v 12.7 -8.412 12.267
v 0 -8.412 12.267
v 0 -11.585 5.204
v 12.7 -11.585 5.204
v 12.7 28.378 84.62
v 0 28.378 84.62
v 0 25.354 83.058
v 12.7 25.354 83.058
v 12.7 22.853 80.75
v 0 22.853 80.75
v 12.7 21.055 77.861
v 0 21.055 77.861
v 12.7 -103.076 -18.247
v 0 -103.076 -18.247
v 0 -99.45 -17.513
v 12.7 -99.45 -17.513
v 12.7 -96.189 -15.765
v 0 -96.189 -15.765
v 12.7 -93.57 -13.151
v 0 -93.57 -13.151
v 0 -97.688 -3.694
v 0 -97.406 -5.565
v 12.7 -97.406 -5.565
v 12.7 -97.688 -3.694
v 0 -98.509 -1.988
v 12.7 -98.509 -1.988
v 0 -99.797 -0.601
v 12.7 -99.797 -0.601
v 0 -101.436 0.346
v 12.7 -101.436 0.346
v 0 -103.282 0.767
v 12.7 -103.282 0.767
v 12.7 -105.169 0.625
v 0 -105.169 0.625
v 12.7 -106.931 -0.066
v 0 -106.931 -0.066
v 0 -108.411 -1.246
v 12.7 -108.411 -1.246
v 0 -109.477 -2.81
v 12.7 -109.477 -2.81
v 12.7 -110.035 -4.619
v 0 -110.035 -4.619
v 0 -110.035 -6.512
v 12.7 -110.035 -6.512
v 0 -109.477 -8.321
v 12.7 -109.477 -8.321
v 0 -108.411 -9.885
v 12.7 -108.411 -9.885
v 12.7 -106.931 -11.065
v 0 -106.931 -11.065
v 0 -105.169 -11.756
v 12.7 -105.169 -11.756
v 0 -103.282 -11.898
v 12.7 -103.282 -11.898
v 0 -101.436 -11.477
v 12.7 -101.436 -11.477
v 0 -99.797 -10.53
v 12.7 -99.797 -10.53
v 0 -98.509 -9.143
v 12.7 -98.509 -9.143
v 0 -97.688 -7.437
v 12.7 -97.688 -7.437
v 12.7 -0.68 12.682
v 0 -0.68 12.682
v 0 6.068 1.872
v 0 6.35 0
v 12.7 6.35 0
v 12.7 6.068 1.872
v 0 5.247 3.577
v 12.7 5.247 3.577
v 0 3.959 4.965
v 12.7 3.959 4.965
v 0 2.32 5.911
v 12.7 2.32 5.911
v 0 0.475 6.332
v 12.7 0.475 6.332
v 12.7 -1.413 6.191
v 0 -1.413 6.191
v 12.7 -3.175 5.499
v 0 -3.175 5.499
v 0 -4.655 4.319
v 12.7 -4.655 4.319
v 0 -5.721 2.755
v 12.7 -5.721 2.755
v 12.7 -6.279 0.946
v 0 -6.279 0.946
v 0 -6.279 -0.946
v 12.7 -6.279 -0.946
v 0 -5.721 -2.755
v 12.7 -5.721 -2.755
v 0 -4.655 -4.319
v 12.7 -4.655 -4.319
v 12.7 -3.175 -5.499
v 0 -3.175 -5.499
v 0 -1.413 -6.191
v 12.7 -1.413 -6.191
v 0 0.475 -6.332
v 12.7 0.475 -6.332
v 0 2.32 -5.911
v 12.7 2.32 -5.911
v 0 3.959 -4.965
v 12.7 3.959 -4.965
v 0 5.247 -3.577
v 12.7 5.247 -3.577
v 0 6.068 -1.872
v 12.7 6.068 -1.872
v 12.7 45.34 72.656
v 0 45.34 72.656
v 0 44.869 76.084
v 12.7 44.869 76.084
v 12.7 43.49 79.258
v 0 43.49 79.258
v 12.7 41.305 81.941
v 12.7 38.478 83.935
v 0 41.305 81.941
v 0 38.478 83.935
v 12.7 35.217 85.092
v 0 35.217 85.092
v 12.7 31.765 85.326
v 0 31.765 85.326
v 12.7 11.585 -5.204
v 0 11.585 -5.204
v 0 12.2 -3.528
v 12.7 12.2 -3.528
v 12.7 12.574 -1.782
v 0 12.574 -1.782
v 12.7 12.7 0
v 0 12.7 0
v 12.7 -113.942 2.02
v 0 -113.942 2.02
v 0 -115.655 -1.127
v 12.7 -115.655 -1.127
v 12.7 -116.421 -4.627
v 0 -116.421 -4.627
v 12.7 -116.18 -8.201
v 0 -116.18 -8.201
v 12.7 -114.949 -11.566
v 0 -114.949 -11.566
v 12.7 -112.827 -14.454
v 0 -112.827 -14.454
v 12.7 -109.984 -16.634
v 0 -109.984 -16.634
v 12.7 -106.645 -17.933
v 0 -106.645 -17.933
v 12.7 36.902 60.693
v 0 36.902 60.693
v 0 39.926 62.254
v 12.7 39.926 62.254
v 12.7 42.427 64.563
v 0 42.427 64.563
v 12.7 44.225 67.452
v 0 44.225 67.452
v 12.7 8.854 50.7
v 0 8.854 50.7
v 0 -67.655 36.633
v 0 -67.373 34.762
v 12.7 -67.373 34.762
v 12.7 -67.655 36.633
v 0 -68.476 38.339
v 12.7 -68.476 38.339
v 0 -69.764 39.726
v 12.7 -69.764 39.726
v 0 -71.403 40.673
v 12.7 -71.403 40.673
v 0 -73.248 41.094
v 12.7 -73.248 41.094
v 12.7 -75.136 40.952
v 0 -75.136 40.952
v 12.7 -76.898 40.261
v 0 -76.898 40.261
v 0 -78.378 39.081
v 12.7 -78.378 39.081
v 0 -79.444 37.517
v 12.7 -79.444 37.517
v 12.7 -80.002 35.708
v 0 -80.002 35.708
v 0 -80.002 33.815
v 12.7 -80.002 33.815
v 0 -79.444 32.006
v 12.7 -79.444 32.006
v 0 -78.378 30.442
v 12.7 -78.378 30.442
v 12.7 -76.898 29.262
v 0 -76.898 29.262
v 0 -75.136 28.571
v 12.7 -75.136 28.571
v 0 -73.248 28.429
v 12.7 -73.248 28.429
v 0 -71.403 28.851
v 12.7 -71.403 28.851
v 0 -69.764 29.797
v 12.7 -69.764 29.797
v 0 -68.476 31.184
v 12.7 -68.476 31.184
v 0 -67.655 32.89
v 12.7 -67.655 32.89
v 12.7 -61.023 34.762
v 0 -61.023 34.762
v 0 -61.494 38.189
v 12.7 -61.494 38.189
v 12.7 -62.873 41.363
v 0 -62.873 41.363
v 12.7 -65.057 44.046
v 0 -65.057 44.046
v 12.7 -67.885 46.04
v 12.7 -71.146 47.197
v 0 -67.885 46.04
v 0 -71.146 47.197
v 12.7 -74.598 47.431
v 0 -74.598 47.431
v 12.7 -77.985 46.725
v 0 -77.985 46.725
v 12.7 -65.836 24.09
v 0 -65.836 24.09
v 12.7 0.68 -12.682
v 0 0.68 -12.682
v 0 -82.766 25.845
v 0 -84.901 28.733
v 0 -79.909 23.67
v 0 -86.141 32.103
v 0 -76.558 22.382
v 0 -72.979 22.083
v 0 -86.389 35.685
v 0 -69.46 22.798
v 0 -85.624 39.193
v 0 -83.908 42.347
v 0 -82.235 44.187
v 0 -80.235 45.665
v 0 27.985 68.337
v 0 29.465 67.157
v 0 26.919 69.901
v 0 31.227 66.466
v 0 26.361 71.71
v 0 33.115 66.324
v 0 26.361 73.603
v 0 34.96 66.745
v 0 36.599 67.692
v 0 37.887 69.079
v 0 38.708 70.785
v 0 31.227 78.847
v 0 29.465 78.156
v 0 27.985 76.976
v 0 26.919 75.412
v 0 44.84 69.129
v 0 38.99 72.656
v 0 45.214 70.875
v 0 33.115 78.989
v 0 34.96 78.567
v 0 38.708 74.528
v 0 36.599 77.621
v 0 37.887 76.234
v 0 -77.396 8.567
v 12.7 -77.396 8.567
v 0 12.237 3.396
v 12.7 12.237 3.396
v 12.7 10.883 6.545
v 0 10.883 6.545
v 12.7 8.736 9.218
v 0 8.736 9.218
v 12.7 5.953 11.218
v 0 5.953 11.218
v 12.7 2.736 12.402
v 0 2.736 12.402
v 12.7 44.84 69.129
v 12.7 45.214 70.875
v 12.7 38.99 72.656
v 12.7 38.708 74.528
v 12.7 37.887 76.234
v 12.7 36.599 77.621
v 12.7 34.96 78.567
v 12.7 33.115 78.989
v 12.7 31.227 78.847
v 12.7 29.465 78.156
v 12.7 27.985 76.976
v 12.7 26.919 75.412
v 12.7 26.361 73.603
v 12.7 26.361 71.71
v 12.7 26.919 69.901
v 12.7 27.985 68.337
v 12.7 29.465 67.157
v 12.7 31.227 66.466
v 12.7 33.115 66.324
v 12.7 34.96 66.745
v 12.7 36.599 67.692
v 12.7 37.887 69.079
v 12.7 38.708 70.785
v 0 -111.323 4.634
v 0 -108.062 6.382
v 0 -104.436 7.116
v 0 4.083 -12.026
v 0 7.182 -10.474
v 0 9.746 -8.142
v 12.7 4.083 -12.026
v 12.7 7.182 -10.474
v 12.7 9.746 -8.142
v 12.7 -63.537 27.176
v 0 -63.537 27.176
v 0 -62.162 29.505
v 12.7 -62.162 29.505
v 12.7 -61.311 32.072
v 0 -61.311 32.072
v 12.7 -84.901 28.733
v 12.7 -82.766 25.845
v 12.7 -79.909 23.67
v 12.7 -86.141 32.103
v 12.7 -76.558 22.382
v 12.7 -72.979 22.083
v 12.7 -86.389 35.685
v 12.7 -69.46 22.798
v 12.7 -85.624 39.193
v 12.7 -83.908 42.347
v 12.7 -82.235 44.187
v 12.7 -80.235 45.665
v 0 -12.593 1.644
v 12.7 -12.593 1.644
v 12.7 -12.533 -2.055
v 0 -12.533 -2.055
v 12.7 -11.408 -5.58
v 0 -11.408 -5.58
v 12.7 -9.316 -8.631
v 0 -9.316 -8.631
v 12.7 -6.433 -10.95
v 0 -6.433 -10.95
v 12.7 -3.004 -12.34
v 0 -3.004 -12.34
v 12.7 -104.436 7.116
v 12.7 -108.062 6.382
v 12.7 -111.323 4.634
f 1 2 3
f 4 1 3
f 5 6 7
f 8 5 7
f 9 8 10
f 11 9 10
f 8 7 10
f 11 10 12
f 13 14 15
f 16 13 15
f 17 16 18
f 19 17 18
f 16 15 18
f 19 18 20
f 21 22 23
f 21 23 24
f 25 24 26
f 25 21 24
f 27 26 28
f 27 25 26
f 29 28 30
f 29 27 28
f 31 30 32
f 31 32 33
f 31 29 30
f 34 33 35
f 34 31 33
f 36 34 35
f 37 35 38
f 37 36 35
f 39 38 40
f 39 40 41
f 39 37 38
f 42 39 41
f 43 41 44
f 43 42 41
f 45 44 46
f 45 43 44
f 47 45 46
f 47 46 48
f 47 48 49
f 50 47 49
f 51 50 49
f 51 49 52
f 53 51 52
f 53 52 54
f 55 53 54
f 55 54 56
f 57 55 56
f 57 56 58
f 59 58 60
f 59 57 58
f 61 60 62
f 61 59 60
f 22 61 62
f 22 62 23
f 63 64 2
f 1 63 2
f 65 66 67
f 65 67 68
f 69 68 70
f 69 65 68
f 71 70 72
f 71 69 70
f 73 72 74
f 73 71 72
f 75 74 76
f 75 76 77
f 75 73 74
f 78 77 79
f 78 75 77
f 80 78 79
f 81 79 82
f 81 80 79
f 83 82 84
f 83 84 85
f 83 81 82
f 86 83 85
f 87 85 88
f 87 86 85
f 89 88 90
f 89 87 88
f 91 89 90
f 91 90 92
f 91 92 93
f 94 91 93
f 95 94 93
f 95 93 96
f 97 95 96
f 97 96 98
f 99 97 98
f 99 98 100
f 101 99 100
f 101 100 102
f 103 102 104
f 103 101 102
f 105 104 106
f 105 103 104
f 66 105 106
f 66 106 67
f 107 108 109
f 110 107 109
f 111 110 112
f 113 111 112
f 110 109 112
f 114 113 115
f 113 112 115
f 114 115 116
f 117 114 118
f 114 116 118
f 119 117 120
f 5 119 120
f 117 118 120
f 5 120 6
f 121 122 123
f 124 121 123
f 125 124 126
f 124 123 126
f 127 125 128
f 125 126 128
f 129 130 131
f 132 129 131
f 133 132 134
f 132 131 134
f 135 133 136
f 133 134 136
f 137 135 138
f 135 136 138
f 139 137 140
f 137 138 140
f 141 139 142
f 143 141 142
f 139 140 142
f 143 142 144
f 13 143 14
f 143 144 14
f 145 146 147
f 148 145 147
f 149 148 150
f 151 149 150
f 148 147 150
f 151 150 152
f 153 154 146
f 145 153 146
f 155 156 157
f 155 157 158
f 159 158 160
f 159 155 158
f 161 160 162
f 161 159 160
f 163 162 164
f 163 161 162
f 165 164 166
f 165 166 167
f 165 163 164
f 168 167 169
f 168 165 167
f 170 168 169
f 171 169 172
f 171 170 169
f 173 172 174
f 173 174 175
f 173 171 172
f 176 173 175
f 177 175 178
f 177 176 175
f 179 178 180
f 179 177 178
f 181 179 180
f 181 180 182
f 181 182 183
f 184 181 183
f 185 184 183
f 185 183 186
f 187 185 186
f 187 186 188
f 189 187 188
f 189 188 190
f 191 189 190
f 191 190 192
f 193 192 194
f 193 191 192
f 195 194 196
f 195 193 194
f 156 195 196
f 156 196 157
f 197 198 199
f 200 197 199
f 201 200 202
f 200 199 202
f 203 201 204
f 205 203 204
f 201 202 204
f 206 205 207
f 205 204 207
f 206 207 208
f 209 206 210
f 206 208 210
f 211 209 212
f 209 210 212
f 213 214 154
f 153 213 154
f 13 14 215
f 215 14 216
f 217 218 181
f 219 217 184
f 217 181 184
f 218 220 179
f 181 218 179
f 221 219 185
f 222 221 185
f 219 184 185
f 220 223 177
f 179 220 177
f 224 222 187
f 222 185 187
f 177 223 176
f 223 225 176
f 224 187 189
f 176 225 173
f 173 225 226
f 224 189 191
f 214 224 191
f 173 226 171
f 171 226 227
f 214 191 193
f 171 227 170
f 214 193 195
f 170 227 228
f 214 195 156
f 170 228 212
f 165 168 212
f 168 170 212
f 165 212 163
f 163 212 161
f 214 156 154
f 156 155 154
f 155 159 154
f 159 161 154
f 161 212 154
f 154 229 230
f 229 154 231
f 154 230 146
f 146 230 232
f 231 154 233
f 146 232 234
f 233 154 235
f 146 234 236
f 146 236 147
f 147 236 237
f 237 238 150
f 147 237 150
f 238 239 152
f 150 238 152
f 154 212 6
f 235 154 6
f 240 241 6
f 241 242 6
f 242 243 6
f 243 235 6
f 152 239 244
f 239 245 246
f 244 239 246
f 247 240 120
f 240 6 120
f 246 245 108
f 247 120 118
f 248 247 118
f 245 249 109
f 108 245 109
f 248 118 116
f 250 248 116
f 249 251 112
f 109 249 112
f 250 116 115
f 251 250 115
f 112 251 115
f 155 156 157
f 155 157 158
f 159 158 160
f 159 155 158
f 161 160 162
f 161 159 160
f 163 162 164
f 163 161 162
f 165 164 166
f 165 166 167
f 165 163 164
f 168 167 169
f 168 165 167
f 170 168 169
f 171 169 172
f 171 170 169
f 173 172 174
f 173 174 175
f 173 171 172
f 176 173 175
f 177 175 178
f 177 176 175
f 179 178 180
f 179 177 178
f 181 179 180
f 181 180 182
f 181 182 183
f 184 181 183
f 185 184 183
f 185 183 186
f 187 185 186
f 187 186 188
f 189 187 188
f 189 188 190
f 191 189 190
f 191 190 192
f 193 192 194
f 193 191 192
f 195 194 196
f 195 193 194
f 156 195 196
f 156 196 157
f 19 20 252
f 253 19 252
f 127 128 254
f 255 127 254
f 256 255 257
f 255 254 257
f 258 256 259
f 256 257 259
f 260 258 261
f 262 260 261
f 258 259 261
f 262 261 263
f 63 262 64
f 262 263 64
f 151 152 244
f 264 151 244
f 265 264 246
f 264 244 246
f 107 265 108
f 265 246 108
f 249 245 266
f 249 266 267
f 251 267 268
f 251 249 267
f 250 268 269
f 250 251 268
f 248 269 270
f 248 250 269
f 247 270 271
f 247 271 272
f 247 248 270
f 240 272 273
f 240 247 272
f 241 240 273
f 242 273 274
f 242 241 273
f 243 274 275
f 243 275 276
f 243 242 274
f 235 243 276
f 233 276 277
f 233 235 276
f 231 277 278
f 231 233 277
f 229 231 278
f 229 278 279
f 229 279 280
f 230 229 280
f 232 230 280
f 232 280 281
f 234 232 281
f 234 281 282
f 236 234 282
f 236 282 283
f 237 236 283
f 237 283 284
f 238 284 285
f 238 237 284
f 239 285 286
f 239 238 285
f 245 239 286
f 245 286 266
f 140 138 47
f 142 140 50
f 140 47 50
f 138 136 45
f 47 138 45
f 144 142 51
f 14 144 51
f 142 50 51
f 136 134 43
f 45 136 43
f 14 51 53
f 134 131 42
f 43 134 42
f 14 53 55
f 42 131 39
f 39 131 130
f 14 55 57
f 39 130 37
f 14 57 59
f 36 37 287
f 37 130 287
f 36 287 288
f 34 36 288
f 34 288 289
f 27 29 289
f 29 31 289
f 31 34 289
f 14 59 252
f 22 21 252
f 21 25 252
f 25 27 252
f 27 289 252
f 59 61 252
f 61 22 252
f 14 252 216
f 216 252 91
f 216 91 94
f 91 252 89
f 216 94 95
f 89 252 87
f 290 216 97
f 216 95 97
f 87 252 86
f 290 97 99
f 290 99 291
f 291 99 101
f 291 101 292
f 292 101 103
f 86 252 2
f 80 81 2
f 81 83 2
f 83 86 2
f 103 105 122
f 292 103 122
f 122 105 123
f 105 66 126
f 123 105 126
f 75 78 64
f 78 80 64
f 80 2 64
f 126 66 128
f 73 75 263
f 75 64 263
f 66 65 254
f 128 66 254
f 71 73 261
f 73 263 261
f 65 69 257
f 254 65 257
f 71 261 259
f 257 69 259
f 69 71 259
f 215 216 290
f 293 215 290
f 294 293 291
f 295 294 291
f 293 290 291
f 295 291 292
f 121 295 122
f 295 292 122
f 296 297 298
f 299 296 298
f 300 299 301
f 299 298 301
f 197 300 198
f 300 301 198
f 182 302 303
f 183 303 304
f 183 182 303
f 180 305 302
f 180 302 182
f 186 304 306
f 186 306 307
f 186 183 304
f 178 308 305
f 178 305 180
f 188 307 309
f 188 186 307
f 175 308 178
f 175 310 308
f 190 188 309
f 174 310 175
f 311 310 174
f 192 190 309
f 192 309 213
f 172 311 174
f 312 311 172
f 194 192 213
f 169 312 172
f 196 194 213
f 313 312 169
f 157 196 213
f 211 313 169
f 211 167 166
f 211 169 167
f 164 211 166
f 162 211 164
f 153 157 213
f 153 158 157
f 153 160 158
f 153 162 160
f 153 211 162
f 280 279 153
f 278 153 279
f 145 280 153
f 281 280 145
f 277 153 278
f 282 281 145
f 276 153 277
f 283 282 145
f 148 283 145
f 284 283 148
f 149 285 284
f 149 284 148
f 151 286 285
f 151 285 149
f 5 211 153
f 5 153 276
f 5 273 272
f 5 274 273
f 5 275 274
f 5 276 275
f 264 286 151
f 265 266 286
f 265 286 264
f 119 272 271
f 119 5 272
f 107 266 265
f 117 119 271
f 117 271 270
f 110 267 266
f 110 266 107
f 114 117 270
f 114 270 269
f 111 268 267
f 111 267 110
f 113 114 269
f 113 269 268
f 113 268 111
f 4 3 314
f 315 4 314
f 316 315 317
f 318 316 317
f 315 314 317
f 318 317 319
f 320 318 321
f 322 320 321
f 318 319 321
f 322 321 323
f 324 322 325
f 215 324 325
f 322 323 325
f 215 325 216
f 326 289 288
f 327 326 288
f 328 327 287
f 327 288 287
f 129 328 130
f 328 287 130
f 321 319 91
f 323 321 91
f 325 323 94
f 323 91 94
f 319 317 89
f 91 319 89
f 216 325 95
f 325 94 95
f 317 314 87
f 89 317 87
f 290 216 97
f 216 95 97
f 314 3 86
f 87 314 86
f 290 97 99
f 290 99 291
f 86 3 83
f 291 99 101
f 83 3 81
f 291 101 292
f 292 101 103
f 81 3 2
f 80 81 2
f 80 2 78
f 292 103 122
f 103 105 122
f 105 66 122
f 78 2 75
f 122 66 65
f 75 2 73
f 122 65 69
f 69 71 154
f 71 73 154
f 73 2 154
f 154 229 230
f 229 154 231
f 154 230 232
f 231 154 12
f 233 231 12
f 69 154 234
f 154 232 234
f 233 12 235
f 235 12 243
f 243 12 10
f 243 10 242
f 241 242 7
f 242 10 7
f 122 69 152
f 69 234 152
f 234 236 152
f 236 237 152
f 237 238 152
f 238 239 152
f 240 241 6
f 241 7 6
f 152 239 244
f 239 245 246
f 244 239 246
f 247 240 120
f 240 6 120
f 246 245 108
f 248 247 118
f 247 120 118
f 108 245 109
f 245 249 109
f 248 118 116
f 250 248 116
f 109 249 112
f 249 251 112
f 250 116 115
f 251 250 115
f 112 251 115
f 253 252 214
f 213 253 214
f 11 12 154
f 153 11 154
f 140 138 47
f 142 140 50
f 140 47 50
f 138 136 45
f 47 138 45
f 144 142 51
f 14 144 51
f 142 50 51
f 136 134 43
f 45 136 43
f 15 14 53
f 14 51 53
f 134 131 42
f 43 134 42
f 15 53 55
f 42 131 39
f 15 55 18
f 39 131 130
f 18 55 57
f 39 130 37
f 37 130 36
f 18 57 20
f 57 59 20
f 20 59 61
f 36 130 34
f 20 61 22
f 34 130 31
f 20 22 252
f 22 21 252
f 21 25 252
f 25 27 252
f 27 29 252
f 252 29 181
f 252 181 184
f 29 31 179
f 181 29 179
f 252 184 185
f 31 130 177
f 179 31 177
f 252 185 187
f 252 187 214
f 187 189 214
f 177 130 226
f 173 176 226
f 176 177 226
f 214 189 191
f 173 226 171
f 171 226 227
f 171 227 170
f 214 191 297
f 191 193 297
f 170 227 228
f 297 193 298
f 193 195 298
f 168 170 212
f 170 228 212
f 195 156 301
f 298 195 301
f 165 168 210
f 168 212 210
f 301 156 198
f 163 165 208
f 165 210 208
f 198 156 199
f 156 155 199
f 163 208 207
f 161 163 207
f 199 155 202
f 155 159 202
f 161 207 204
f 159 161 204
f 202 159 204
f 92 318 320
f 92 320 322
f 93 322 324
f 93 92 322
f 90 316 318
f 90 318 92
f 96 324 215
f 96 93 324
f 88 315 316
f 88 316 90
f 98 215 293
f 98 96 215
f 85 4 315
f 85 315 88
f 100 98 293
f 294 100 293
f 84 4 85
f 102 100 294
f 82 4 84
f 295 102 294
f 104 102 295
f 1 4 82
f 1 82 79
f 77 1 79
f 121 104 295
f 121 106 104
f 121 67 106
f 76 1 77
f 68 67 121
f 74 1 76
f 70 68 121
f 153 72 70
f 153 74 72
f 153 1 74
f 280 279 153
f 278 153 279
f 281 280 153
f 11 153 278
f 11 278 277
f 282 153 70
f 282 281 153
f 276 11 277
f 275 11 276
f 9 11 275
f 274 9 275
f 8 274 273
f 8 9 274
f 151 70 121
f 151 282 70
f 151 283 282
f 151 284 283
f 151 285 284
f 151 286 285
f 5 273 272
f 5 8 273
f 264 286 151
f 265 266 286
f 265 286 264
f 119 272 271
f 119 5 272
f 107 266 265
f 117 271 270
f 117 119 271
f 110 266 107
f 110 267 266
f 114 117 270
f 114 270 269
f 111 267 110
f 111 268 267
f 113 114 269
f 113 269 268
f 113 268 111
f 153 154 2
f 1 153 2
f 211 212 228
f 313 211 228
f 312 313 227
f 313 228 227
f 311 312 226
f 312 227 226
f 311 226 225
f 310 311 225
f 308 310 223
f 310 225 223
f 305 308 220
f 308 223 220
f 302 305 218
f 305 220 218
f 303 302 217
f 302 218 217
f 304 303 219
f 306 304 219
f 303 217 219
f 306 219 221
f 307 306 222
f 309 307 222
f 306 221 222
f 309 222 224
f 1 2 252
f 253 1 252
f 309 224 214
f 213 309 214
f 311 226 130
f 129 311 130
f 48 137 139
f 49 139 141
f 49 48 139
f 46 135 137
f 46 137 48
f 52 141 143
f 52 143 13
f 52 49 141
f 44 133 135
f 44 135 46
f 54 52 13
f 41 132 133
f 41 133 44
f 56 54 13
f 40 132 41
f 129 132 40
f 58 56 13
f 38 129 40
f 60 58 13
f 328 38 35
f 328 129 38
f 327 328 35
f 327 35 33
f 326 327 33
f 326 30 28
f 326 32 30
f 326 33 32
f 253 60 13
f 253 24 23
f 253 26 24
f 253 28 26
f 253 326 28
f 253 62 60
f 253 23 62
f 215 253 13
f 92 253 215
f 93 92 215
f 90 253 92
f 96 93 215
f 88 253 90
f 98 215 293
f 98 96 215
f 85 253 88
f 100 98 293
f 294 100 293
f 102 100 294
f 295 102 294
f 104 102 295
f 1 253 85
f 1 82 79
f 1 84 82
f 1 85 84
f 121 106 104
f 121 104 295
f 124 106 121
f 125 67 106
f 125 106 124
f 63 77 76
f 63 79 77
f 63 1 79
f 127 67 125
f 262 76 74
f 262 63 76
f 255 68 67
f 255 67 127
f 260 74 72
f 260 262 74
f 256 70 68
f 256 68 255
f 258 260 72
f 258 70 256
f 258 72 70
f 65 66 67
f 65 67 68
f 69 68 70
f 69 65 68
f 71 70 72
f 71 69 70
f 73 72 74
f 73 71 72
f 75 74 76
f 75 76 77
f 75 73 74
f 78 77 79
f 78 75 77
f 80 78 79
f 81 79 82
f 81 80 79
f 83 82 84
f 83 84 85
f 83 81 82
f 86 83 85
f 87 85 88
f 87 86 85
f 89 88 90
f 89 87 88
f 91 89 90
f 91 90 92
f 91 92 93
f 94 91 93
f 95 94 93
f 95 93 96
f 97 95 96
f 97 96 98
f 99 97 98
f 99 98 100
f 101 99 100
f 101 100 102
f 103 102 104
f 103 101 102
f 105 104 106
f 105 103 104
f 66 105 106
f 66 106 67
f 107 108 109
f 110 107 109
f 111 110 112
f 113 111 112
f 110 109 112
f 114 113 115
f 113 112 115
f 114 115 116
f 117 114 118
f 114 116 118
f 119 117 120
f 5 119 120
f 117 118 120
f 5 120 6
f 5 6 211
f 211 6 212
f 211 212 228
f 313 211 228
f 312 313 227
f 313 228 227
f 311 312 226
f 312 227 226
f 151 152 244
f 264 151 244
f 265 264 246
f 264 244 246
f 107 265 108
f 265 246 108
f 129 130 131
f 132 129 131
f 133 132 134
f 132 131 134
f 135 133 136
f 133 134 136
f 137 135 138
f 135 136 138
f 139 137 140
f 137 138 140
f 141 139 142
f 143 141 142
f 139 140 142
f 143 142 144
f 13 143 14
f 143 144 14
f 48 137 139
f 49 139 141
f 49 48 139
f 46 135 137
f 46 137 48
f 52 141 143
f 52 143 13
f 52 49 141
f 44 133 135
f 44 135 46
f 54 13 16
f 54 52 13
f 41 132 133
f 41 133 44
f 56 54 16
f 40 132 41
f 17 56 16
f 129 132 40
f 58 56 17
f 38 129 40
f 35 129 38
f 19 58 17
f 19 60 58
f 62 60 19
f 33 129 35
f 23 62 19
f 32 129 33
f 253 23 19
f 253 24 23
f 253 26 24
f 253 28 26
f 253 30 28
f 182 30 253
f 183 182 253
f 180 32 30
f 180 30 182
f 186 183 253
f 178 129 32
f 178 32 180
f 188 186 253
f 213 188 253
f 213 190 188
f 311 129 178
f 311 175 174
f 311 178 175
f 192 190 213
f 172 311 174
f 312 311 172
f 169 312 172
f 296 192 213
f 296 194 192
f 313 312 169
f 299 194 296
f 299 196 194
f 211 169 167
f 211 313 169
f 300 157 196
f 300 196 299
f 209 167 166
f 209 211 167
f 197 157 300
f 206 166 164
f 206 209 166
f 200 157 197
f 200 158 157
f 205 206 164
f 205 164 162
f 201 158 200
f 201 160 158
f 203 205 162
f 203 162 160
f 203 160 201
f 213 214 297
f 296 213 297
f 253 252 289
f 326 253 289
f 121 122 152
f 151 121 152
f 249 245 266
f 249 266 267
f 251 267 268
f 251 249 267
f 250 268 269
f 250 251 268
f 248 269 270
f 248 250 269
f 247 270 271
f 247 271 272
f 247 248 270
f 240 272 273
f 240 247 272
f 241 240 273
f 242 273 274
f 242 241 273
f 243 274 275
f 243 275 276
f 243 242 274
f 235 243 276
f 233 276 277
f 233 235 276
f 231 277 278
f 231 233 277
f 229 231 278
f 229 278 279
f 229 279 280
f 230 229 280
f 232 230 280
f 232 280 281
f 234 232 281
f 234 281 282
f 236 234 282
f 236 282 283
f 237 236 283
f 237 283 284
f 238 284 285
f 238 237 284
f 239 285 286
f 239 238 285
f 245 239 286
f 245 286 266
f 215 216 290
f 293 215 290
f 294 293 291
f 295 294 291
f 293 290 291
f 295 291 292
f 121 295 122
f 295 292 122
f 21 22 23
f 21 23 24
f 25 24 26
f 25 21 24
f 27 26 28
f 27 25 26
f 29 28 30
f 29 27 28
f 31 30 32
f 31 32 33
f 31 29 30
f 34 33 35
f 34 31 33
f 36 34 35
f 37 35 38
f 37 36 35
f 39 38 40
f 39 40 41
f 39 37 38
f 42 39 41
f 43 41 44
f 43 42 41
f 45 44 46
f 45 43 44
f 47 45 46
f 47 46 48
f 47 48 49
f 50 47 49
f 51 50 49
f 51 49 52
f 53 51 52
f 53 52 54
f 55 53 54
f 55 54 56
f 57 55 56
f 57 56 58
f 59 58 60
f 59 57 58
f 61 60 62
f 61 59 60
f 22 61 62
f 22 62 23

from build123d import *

# Parameters (mm, degrees)
F0_R     = 6.35
F1_DEPTH = 12.7
F2_DEPTH = 12.7
F3_DEPTH = 12.7
F4_DEPTH = 12.7


with BuildPart() as f1:
    # F0 (on Right) → F1 (new body)
    with BuildSketch(Plane.YZ):
        with BuildLine():
            ThreePointArc((-83.9083950328, 42.3472659243), (-83.9361302008, 27.2132734438), (-69.4604435559, 22.7981863781))
            ThreePointArc((-69.4604435559, 22.7981863781), (-66.1744473375, 24.5481989863), (-63.5371080479, 27.1758893691))
            ThreePointArc((-63.5371080479, 27.1758893691), (-61.6677178956, 30.7658094073), (-61.0227515404, 34.7615776467))
            ThreePointArc((-61.0227515404, 34.7615776467), (-66.4029602661, 45.1399520715), (-77.9850595248, 46.7249689153))
            ThreePointArc((-77.9850595248, 46.7249689153), (-81.2710557432, 44.9749563071), (-83.9083950328, 42.3472659243))
        make_face()
        with Locations((-73.7227515404, 34.7615776467)):
            Circle(F0_R, mode=Mode.SUBTRACT)
        with BuildLine():
            Line((-104.4363172723, 7.1162714515), (-77.3961663813, 8.5667108531))
            Line((-77.3961663813, 8.5667108531), (-65.8355577842, 24.0896579367))
            Line((-65.8355577842, 24.0896579367), (-69.4604435559, 22.7981863781))
            ThreePointArc((-69.4604435559, 22.7981863781), (-83.9361302008, 27.2132734438), (-83.9083950328, 42.3472659243))
            Line((-83.9083950328, 42.3472659243), (-113.9417080171, 2.0201910748))
            ThreePointArc((-113.9417080171, 2.0201910748), (-109.7568506462, 5.6273829415), (-104.4363172723, 7.1162714515))
        make_face()
        with BuildLine():
            Line((-69.4604435559, 22.7981863781), (-65.8355577842, 24.0896579367))
            Line((-65.8355577842, 24.0896579367), (-63.5371080479, 27.1758893691))
            ThreePointArc((-63.5371080479, 27.1758893691), (-66.1744473375, 24.5481989863), (-69.4604435559, 22.7981863781))
        make_face()
        with BuildLine():
            Line((-93.5704210322, -13.1511854804), (-77.3961663813, 8.5667108531))
            Line((-77.3961663813, 8.5667108531), (-104.4363172723, 7.1162714515))
            ThreePointArc((-104.4363172723, 7.1162714515), (-95.0196238849, 3.6521274884), (-91.0560645247, -5.5654972028))
            ThreePointArc((-91.0560645247, -5.5654972028), (-91.7010308799, -9.5612654422), (-93.5704210322, -13.1511854804))
        make_face()
        with BuildLine():
            ThreePointArc((-113.9417080171, 2.0201910748), (-114.948944669, -11.5662833243), (-103.0758117771, -18.247265857))
            ThreePointArc((-103.0758117771, -18.247265857), (-97.7552784032, -16.758377347), (-93.5704210322, -13.1511854804))
            ThreePointArc((-93.5704210322, -13.1511854804), (-91.7010308799, -9.5612654422), (-91.0560645247, -5.5654972028))
            ThreePointArc((-91.0560645247, -5.5654972028), (-95.0196238849, 3.6521274884), (-104.4363172723, 7.1162714515))
            ThreePointArc((-104.4363172723, 7.1162714515), (-109.7568506462, 5.6273829415), (-113.9417080171, 2.0201910748))
        make_face()
        with Locations((-103.7560645247, -5.5654972028)):
            Circle(F0_R, mode=Mode.SUBTRACT)
    extrude(amount=F1_DEPTH)


with BuildPart() as f2:
    # F0 (on Right) → F2 (new body)
    with BuildSketch(Plane.YZ):
        with BuildLine():
            Line((21.055316714, 77.860714389), (8.853634096, 50.6998666772))
            Line((8.853634096, 50.6998666772), (36.9023292992, 60.6930345702))
            ThreePointArc((36.9023292992, 60.6930345702), (23.3079968483, 64.0422909805), (21.055316714, 77.860714389))
        make_face()
        with BuildLine():
            ThreePointArc((-0.6802527476, 12.6817686542), (8.7364406398, 9.2176246912), (12.7, 0))
            ThreePointArc((12.7, 0), (12.4180463123, -2.6612263687), (11.5847046007, -5.2042885502))
            Line((11.5847046007, -5.2042885502), (44.2247259155, 67.4521372886))
            ThreePointArc((44.2247259155, 67.4521372886), (41.2541561731, 63.3244013724), (36.9023292992, 60.6930345702))
            Line((36.9023292992, 60.6930345702), (8.853634096, 50.6998666772))
            Line((8.853634096, 50.6998666772), (-8.411846923, 12.2670443106))
            Line((-8.411846923, 12.2670443106), (-0.6802527476, 12.6817686542))
        make_face()
        with BuildLine():
            ThreePointArc((36.9023292992, 60.6930345702), (41.2541561731, 63.3244013724), (44.2247259155, 67.4521372886))
            ThreePointArc((44.2247259155, 67.4521372886), (45.058067627, 69.9951994701), (45.3400213147, 72.6564258388))
            ThreePointArc((45.3400213147, 72.6564258388), (39.959812589, 83.0348002636), (28.3777133303, 84.6198171074))
            ThreePointArc((28.3777133303, 84.6198171074), (24.0258864564, 81.9884503053), (21.055316714, 77.860714389))
            ThreePointArc((21.055316714, 77.860714389), (23.3079968483, 64.0422909805), (36.9023292992, 60.6930345702))
        make_face()
        with Locations((32.6400213147, 72.6564258388)):
            Circle(F0_R, mode=Mode.SUBTRACT)
        with BuildLine():
            ThreePointArc((-11.5847046007, 5.2042885502), (-7.1823026855, 10.4739929413), (-0.6802527476, 12.6817686542))
            Line((-0.6802527476, 12.6817686542), (-8.411846923, 12.2670443106))
            Line((-8.411846923, 12.2670443106), (-11.5847046007, 5.2042885502))
        make_face()
        with BuildLine():
            ThreePointArc((11.5847046007, -5.2042885502), (12.4180463123, -2.6612263687), (12.7, 0))
            ThreePointArc((12.7, 0), (8.7364406398, 9.2176246912), (-0.6802527476, 12.6817686542))
            ThreePointArc((-0.6802527476, 12.6817686542), (-7.1823026855, 10.4739929413), (-11.5847046007, 5.2042885502))
            ThreePointArc((-11.5847046007, 5.2042885502), (-10.4739929413, -7.1823026855), (0.6802527476, -12.6817686542))
            ThreePointArc((0.6802527476, -12.6817686542), (7.1823026855, -10.4739929413), (11.5847046007, -5.2042885502))
        make_face()
        Circle(F0_R, mode=Mode.SUBTRACT)
    extrude(amount=F2_DEPTH)


with BuildPart() as f3:
    # F0 (on Right) → F3 (new body)
    with BuildSketch(Plane.YZ):
        with BuildLine():
            ThreePointArc((-83.9083950328, 42.3472659243), (-83.9361302008, 27.2132734438), (-69.4604435559, 22.7981863781))
            ThreePointArc((-69.4604435559, 22.7981863781), (-66.1744473375, 24.5481989863), (-63.5371080479, 27.1758893691))
            ThreePointArc((-63.5371080479, 27.1758893691), (-61.6677178956, 30.7658094073), (-61.0227515404, 34.7615776467))
            ThreePointArc((-61.0227515404, 34.7615776467), (-66.4029602661, 45.1399520715), (-77.9850595248, 46.7249689153))
            ThreePointArc((-77.9850595248, 46.7249689153), (-81.2710557432, 44.9749563071), (-83.9083950328, 42.3472659243))
        make_face()
        with Locations((-73.7227515404, 34.7615776467)):
            Circle(F0_R, mode=Mode.SUBTRACT)
        with BuildLine():
            Line((-65.8355577842, 24.0896579367), (8.853634096, 50.6998666772))
            Line((8.853634096, 50.6998666772), (21.055316714, 77.860714389))
            ThreePointArc((21.055316714, 77.860714389), (24.0258864564, 81.9884503053), (28.3777133303, 84.6198171074))
            Line((28.3777133303, 84.6198171074), (-77.9850595248, 46.7249689153))
            ThreePointArc((-77.9850595248, 46.7249689153), (-66.4029602661, 45.1399520715), (-61.0227515404, 34.7615776467))
            ThreePointArc((-61.0227515404, 34.7615776467), (-61.6677178956, 30.7658094073), (-63.5371080479, 27.1758893691))
            Line((-63.5371080479, 27.1758893691), (-65.8355577842, 24.0896579367))
        make_face()
        with BuildLine():
            Line((21.055316714, 77.860714389), (8.853634096, 50.6998666772))
            Line((8.853634096, 50.6998666772), (36.9023292992, 60.6930345702))
            ThreePointArc((36.9023292992, 60.6930345702), (23.3079968483, 64.0422909805), (21.055316714, 77.860714389))
        make_face()
        with BuildLine():
            ThreePointArc((36.9023292992, 60.6930345702), (41.2541561731, 63.3244013724), (44.2247259155, 67.4521372886))
            ThreePointArc((44.2247259155, 67.4521372886), (45.058067627, 69.9951994701), (45.3400213147, 72.6564258388))
            ThreePointArc((45.3400213147, 72.6564258388), (39.959812589, 83.0348002636), (28.3777133303, 84.6198171074))
            ThreePointArc((28.3777133303, 84.6198171074), (24.0258864564, 81.9884503053), (21.055316714, 77.860714389))
            ThreePointArc((21.055316714, 77.860714389), (23.3079968483, 64.0422909805), (36.9023292992, 60.6930345702))
        make_face()
        with Locations((32.6400213147, 72.6564258388)):
            Circle(F0_R, mode=Mode.SUBTRACT)
        with BuildLine():
            Line((-69.4604435559, 22.7981863781), (-65.8355577842, 24.0896579367))
            Line((-65.8355577842, 24.0896579367), (-63.5371080479, 27.1758893691))
            ThreePointArc((-63.5371080479, 27.1758893691), (-66.1744473375, 24.5481989863), (-69.4604435559, 22.7981863781))
        make_face()
    extrude(amount=F3_DEPTH)


with BuildPart() as f4:
    # F0 (on Right) → F4 (new body)
    with BuildSketch(Plane.YZ):
        with BuildLine():
            ThreePointArc((-113.9417080171, 2.0201910748), (-114.948944669, -11.5662833243), (-103.0758117771, -18.247265857))
            ThreePointArc((-103.0758117771, -18.247265857), (-97.7552784032, -16.758377347), (-93.5704210322, -13.1511854804))
            ThreePointArc((-93.5704210322, -13.1511854804), (-91.7010308799, -9.5612654422), (-91.0560645247, -5.5654972028))
            ThreePointArc((-91.0560645247, -5.5654972028), (-95.0196238849, 3.6521274884), (-104.4363172723, 7.1162714515))
            ThreePointArc((-104.4363172723, 7.1162714515), (-109.7568506462, 5.6273829415), (-113.9417080171, 2.0201910748))
        make_face()
        with Locations((-103.7560645247, -5.5654972028)):
            Circle(F0_R, mode=Mode.SUBTRACT)
        with BuildLine():
            ThreePointArc((0.6802527476, -12.6817686542), (-10.4739929413, -7.1823026855), (-11.5847046007, 5.2042885502))
            Line((-11.5847046007, 5.2042885502), (-8.411846923, 12.2670443106))
            Line((-8.411846923, 12.2670443106), (-77.3961663813, 8.5667108531))
            Line((-77.3961663813, 8.5667108531), (-93.5704210322, -13.1511854804))
            ThreePointArc((-93.5704210322, -13.1511854804), (-97.7552784032, -16.758377347), (-103.0758117771, -18.247265857))
            Line((-103.0758117771, -18.247265857), (0.6802527476, -12.6817686542))
        make_face()
        with BuildLine():
            ThreePointArc((-11.5847046007, 5.2042885502), (-7.1823026855, 10.4739929413), (-0.6802527476, 12.6817686542))
            Line((-0.6802527476, 12.6817686542), (-8.411846923, 12.2670443106))
            Line((-8.411846923, 12.2670443106), (-11.5847046007, 5.2042885502))
        make_face()
        with BuildLine():
            ThreePointArc((11.5847046007, -5.2042885502), (12.4180463123, -2.6612263687), (12.7, 0))
            ThreePointArc((12.7, 0), (8.7364406398, 9.2176246912), (-0.6802527476, 12.6817686542))
            ThreePointArc((-0.6802527476, 12.6817686542), (-7.1823026855, 10.4739929413), (-11.5847046007, 5.2042885502))
            ThreePointArc((-11.5847046007, 5.2042885502), (-10.4739929413, -7.1823026855), (0.6802527476, -12.6817686542))
            ThreePointArc((0.6802527476, -12.6817686542), (7.1823026855, -10.4739929413), (11.5847046007, -5.2042885502))
        make_face()
        Circle(F0_R, mode=Mode.SUBTRACT)
        with BuildLine():
            Line((-93.5704210322, -13.1511854804), (-77.3961663813, 8.5667108531))
            Line((-77.3961663813, 8.5667108531), (-104.4363172723, 7.1162714515))
            ThreePointArc((-104.4363172723, 7.1162714515), (-95.0196238849, 3.6521274884), (-91.0560645247, -5.5654972028))
            ThreePointArc((-91.0560645247, -5.5654972028), (-91.7010308799, -9.5612654422), (-93.5704210322, -13.1511854804))
        make_face()
    extrude(amount=F4_DEPTH)


solid = Compound([f1.part, f2.part, f3.part, f4.part])
